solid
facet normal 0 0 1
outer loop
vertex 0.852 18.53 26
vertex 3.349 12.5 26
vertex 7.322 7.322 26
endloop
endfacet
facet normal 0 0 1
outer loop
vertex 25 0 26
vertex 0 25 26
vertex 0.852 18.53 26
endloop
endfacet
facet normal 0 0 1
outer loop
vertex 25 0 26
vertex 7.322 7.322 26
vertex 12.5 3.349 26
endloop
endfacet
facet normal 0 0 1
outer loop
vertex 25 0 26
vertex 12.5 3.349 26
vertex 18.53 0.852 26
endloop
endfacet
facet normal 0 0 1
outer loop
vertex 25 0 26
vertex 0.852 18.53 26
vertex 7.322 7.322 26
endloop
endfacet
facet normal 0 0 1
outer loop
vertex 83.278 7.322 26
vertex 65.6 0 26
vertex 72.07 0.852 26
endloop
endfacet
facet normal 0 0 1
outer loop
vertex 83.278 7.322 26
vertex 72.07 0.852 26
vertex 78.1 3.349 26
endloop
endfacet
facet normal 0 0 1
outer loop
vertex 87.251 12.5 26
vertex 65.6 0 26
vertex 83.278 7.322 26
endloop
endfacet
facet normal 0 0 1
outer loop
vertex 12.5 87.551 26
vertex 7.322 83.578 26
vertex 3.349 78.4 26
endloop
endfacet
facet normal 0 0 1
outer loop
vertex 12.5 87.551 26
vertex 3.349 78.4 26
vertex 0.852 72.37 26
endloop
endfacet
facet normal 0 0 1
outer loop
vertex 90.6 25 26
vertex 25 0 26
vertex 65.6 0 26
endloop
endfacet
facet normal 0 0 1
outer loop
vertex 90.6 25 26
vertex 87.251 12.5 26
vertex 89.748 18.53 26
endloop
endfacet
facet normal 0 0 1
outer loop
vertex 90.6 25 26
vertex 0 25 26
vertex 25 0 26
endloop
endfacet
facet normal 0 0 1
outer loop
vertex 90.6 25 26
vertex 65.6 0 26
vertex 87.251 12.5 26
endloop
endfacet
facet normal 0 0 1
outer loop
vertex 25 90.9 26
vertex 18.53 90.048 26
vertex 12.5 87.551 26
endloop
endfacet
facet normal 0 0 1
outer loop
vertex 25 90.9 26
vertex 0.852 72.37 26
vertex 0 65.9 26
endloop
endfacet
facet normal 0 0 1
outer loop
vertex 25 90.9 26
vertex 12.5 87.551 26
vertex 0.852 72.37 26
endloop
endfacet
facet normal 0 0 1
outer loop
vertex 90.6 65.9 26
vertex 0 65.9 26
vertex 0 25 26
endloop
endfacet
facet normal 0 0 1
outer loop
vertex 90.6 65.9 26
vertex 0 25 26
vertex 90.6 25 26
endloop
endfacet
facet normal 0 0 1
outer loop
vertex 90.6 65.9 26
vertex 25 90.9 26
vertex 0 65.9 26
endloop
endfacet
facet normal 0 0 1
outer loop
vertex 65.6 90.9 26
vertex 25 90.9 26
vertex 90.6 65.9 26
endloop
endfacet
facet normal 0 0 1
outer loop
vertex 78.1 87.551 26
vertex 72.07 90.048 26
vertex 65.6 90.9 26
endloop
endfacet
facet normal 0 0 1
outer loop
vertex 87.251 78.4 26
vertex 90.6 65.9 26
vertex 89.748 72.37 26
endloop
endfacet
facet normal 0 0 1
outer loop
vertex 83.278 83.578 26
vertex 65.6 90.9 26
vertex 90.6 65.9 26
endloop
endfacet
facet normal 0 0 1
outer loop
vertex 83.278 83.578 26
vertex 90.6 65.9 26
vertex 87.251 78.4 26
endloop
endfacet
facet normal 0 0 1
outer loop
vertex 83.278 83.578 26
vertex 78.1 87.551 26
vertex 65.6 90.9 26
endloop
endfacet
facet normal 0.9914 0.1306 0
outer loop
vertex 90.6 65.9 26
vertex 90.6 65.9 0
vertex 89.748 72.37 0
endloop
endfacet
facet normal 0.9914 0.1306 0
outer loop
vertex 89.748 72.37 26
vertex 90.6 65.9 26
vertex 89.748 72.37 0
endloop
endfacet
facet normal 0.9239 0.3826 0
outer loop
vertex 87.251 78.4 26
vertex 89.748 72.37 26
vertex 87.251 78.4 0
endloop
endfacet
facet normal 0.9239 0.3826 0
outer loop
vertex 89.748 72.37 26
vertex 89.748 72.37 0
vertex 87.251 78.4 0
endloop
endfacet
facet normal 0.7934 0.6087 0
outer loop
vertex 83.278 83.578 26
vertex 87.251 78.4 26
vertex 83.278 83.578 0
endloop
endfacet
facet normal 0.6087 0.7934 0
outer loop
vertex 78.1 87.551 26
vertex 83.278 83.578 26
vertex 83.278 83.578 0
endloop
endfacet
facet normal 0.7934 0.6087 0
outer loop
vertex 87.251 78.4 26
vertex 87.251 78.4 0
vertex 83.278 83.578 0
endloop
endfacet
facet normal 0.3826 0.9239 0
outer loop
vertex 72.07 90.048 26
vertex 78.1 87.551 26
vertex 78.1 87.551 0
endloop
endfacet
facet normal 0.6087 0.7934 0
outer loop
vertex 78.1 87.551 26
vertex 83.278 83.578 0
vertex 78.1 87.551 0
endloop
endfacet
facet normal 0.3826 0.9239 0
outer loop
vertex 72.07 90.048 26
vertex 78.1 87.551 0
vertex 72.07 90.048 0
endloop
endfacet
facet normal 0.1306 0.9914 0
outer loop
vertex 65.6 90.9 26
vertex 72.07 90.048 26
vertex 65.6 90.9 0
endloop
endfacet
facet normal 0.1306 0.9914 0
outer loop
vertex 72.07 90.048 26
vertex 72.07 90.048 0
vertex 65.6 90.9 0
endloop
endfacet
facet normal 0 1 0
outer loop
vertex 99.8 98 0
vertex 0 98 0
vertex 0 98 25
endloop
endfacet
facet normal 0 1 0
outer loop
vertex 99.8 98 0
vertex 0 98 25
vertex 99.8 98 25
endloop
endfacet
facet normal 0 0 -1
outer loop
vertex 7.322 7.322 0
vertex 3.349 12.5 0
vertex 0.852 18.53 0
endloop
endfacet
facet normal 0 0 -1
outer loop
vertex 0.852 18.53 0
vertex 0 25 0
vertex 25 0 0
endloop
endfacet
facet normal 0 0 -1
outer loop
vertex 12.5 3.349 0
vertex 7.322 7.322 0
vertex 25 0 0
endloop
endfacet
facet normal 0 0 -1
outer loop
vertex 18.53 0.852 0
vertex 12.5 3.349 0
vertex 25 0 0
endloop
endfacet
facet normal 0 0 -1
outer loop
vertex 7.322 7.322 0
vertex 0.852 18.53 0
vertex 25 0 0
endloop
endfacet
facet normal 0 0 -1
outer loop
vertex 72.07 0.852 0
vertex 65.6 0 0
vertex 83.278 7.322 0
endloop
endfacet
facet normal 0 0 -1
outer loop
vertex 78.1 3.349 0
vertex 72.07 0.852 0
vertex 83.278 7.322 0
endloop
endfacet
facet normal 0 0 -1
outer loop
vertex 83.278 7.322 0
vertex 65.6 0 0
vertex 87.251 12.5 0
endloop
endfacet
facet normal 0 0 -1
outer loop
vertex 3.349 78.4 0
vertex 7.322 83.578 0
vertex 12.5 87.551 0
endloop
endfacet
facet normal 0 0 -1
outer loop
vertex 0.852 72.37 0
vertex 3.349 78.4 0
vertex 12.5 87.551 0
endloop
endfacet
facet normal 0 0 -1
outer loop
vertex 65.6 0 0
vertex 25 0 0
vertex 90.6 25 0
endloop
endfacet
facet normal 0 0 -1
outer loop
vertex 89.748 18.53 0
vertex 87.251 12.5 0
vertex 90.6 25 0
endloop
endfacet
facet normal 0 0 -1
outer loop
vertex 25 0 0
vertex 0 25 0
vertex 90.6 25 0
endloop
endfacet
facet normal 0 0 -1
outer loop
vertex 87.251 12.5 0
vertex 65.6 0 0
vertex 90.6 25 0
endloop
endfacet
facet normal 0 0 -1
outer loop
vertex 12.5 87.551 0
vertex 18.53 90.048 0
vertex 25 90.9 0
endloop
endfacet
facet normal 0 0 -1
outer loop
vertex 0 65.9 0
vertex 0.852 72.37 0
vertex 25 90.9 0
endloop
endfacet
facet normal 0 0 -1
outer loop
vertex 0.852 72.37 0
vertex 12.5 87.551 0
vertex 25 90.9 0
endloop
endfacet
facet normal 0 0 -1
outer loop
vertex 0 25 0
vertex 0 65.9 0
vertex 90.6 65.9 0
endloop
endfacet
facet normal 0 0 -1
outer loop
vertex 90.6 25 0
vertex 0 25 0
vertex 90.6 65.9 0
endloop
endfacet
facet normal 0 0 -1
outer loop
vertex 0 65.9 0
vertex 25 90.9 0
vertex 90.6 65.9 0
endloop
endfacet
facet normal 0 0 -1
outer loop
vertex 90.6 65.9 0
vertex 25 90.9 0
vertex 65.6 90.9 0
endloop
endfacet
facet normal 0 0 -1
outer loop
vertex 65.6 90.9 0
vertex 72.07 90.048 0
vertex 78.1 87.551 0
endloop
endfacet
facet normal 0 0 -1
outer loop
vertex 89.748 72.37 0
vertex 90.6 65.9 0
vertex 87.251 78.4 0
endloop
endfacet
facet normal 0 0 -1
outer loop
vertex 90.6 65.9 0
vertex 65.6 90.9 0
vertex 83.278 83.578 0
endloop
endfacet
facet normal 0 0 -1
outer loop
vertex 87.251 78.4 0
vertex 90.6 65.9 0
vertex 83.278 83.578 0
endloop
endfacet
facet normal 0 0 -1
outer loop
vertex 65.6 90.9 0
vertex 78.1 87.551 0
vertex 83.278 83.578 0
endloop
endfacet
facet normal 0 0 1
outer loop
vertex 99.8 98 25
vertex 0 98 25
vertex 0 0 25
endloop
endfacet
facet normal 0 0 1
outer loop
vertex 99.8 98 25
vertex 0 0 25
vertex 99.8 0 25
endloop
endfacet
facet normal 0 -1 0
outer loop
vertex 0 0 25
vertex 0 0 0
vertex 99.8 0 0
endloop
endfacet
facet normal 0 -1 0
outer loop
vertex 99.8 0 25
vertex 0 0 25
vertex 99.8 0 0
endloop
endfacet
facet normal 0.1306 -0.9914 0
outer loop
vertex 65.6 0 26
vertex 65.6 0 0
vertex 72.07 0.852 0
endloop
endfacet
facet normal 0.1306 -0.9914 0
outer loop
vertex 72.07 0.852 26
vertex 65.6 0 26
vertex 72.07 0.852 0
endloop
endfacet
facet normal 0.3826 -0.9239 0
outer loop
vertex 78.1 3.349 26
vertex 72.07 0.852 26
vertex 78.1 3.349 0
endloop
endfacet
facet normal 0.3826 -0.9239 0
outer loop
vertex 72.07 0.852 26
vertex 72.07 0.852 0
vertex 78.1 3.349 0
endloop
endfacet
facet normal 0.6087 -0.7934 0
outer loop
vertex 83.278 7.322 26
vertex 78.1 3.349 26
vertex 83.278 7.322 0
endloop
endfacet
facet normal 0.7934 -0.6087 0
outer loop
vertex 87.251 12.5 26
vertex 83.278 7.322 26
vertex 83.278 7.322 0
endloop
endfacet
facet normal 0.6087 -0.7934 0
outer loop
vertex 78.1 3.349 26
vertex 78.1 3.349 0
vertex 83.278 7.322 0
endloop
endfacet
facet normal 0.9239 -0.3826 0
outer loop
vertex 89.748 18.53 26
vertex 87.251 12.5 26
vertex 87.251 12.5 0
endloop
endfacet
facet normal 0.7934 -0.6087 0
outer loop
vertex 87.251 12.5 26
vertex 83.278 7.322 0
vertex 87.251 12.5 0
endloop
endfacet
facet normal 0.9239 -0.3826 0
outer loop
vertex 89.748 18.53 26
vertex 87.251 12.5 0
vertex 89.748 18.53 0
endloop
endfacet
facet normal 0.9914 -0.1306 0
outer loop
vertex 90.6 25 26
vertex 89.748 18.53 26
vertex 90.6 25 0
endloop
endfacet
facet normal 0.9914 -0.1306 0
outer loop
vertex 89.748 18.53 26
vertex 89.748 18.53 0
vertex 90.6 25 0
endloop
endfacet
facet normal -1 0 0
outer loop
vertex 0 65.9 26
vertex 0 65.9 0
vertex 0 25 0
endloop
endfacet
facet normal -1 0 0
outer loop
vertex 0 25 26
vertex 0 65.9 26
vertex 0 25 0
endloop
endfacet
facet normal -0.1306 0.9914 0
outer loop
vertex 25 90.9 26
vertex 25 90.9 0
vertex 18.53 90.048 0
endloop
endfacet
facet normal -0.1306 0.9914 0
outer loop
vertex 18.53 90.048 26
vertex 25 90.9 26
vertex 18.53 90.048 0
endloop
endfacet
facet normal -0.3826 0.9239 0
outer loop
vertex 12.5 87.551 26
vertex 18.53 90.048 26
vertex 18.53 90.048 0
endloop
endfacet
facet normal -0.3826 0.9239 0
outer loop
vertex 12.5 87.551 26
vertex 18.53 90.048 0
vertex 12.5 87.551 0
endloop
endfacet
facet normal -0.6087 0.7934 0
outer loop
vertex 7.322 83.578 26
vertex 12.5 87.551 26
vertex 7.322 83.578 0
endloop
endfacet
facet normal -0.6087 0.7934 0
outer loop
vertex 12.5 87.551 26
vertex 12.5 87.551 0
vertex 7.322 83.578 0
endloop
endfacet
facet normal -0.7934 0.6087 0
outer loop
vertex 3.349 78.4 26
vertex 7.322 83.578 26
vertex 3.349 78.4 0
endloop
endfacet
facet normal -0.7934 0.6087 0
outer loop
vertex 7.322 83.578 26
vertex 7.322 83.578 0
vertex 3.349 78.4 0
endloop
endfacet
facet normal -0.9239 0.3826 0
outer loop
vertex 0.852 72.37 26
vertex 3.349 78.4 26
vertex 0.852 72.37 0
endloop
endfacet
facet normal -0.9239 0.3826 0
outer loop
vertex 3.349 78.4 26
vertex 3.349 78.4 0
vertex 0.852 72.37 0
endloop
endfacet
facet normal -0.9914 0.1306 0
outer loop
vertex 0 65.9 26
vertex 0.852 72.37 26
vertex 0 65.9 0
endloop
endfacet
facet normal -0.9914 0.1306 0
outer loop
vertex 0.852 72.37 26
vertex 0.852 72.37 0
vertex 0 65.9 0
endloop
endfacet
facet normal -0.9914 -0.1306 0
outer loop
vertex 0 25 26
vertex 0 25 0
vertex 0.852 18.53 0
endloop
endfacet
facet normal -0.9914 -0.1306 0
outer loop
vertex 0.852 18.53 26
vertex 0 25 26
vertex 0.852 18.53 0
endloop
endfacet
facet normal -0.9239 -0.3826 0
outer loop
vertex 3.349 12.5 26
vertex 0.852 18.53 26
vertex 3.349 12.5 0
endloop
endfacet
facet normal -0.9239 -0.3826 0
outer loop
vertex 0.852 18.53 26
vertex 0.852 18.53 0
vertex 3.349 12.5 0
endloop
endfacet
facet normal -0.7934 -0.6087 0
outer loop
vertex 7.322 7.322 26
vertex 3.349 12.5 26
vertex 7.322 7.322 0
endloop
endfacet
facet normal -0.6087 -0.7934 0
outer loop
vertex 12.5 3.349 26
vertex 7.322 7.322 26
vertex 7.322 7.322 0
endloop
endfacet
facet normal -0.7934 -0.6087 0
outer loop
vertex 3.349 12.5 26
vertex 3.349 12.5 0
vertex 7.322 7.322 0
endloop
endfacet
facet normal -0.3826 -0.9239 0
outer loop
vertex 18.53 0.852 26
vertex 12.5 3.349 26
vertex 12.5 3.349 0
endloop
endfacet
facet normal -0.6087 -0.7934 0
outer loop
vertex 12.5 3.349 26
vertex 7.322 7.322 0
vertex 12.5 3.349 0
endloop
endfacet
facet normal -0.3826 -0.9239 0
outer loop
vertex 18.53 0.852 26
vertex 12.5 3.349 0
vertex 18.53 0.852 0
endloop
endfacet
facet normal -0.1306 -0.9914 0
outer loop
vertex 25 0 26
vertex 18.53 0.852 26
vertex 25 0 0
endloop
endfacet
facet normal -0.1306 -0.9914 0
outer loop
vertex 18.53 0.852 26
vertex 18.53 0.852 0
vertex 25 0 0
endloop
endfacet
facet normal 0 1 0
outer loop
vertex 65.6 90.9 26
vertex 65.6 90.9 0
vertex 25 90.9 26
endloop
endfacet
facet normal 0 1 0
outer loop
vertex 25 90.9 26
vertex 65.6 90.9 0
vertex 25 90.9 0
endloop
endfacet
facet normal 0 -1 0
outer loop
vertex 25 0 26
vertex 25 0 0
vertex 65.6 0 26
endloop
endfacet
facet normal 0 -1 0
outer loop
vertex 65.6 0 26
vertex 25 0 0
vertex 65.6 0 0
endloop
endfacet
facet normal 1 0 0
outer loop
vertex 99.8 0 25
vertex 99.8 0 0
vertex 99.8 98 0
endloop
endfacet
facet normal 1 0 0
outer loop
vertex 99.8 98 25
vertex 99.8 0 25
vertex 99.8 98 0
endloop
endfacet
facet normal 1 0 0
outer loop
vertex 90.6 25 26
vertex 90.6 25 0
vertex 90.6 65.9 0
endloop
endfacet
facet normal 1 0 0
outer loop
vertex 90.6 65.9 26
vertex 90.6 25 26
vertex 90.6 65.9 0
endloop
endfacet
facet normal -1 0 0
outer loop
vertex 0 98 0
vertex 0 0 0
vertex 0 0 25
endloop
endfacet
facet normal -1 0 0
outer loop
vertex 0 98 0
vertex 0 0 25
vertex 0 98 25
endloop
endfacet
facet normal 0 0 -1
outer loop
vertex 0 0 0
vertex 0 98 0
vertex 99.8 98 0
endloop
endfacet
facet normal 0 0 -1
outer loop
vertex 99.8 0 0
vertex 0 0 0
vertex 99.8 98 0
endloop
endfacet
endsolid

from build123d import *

# Parameters (mm, degrees)
SKETCH_W     = 99.8
SKETCH_H     = 98
PAD_DEPTH    = 25
PAD001_DEPTH = 26


with BuildPart() as body:
    # Sketch → Pad (new body)
    with BuildSketch(Plane.XY):
        with Locations((49.9, 49)):
            Rectangle(SKETCH_W, SKETCH_H)
    extrude(amount=PAD_DEPTH)


with BuildPart() as body001:
    # Sketch001 → Pad001 (new body)
    with BuildSketch(Plane.XY):
        with BuildLine():
            Line((25, 0), (65.6, 0))
            ThreePointArc((65.6, 0), (83.27767, 7.32233), (90.6, 25))
            Line((90.6, 25), (90.6, 65.9))
            ThreePointArc((90.6, 65.9), (83.27767, 83.57767), (65.6, 90.9))
            Line((65.6, 90.9), (25, 90.9))
            ThreePointArc((25, 90.9), (7.32233, 83.57767), (0, 65.9))
            Line((0, 65.9), (0, 25))
            ThreePointArc((0, 25), (7.32233, 7.32233), (25, 0))
        make_face()
    extrude(amount=PAD001_DEPTH)


solid = Compound([body.part, body001.part])
